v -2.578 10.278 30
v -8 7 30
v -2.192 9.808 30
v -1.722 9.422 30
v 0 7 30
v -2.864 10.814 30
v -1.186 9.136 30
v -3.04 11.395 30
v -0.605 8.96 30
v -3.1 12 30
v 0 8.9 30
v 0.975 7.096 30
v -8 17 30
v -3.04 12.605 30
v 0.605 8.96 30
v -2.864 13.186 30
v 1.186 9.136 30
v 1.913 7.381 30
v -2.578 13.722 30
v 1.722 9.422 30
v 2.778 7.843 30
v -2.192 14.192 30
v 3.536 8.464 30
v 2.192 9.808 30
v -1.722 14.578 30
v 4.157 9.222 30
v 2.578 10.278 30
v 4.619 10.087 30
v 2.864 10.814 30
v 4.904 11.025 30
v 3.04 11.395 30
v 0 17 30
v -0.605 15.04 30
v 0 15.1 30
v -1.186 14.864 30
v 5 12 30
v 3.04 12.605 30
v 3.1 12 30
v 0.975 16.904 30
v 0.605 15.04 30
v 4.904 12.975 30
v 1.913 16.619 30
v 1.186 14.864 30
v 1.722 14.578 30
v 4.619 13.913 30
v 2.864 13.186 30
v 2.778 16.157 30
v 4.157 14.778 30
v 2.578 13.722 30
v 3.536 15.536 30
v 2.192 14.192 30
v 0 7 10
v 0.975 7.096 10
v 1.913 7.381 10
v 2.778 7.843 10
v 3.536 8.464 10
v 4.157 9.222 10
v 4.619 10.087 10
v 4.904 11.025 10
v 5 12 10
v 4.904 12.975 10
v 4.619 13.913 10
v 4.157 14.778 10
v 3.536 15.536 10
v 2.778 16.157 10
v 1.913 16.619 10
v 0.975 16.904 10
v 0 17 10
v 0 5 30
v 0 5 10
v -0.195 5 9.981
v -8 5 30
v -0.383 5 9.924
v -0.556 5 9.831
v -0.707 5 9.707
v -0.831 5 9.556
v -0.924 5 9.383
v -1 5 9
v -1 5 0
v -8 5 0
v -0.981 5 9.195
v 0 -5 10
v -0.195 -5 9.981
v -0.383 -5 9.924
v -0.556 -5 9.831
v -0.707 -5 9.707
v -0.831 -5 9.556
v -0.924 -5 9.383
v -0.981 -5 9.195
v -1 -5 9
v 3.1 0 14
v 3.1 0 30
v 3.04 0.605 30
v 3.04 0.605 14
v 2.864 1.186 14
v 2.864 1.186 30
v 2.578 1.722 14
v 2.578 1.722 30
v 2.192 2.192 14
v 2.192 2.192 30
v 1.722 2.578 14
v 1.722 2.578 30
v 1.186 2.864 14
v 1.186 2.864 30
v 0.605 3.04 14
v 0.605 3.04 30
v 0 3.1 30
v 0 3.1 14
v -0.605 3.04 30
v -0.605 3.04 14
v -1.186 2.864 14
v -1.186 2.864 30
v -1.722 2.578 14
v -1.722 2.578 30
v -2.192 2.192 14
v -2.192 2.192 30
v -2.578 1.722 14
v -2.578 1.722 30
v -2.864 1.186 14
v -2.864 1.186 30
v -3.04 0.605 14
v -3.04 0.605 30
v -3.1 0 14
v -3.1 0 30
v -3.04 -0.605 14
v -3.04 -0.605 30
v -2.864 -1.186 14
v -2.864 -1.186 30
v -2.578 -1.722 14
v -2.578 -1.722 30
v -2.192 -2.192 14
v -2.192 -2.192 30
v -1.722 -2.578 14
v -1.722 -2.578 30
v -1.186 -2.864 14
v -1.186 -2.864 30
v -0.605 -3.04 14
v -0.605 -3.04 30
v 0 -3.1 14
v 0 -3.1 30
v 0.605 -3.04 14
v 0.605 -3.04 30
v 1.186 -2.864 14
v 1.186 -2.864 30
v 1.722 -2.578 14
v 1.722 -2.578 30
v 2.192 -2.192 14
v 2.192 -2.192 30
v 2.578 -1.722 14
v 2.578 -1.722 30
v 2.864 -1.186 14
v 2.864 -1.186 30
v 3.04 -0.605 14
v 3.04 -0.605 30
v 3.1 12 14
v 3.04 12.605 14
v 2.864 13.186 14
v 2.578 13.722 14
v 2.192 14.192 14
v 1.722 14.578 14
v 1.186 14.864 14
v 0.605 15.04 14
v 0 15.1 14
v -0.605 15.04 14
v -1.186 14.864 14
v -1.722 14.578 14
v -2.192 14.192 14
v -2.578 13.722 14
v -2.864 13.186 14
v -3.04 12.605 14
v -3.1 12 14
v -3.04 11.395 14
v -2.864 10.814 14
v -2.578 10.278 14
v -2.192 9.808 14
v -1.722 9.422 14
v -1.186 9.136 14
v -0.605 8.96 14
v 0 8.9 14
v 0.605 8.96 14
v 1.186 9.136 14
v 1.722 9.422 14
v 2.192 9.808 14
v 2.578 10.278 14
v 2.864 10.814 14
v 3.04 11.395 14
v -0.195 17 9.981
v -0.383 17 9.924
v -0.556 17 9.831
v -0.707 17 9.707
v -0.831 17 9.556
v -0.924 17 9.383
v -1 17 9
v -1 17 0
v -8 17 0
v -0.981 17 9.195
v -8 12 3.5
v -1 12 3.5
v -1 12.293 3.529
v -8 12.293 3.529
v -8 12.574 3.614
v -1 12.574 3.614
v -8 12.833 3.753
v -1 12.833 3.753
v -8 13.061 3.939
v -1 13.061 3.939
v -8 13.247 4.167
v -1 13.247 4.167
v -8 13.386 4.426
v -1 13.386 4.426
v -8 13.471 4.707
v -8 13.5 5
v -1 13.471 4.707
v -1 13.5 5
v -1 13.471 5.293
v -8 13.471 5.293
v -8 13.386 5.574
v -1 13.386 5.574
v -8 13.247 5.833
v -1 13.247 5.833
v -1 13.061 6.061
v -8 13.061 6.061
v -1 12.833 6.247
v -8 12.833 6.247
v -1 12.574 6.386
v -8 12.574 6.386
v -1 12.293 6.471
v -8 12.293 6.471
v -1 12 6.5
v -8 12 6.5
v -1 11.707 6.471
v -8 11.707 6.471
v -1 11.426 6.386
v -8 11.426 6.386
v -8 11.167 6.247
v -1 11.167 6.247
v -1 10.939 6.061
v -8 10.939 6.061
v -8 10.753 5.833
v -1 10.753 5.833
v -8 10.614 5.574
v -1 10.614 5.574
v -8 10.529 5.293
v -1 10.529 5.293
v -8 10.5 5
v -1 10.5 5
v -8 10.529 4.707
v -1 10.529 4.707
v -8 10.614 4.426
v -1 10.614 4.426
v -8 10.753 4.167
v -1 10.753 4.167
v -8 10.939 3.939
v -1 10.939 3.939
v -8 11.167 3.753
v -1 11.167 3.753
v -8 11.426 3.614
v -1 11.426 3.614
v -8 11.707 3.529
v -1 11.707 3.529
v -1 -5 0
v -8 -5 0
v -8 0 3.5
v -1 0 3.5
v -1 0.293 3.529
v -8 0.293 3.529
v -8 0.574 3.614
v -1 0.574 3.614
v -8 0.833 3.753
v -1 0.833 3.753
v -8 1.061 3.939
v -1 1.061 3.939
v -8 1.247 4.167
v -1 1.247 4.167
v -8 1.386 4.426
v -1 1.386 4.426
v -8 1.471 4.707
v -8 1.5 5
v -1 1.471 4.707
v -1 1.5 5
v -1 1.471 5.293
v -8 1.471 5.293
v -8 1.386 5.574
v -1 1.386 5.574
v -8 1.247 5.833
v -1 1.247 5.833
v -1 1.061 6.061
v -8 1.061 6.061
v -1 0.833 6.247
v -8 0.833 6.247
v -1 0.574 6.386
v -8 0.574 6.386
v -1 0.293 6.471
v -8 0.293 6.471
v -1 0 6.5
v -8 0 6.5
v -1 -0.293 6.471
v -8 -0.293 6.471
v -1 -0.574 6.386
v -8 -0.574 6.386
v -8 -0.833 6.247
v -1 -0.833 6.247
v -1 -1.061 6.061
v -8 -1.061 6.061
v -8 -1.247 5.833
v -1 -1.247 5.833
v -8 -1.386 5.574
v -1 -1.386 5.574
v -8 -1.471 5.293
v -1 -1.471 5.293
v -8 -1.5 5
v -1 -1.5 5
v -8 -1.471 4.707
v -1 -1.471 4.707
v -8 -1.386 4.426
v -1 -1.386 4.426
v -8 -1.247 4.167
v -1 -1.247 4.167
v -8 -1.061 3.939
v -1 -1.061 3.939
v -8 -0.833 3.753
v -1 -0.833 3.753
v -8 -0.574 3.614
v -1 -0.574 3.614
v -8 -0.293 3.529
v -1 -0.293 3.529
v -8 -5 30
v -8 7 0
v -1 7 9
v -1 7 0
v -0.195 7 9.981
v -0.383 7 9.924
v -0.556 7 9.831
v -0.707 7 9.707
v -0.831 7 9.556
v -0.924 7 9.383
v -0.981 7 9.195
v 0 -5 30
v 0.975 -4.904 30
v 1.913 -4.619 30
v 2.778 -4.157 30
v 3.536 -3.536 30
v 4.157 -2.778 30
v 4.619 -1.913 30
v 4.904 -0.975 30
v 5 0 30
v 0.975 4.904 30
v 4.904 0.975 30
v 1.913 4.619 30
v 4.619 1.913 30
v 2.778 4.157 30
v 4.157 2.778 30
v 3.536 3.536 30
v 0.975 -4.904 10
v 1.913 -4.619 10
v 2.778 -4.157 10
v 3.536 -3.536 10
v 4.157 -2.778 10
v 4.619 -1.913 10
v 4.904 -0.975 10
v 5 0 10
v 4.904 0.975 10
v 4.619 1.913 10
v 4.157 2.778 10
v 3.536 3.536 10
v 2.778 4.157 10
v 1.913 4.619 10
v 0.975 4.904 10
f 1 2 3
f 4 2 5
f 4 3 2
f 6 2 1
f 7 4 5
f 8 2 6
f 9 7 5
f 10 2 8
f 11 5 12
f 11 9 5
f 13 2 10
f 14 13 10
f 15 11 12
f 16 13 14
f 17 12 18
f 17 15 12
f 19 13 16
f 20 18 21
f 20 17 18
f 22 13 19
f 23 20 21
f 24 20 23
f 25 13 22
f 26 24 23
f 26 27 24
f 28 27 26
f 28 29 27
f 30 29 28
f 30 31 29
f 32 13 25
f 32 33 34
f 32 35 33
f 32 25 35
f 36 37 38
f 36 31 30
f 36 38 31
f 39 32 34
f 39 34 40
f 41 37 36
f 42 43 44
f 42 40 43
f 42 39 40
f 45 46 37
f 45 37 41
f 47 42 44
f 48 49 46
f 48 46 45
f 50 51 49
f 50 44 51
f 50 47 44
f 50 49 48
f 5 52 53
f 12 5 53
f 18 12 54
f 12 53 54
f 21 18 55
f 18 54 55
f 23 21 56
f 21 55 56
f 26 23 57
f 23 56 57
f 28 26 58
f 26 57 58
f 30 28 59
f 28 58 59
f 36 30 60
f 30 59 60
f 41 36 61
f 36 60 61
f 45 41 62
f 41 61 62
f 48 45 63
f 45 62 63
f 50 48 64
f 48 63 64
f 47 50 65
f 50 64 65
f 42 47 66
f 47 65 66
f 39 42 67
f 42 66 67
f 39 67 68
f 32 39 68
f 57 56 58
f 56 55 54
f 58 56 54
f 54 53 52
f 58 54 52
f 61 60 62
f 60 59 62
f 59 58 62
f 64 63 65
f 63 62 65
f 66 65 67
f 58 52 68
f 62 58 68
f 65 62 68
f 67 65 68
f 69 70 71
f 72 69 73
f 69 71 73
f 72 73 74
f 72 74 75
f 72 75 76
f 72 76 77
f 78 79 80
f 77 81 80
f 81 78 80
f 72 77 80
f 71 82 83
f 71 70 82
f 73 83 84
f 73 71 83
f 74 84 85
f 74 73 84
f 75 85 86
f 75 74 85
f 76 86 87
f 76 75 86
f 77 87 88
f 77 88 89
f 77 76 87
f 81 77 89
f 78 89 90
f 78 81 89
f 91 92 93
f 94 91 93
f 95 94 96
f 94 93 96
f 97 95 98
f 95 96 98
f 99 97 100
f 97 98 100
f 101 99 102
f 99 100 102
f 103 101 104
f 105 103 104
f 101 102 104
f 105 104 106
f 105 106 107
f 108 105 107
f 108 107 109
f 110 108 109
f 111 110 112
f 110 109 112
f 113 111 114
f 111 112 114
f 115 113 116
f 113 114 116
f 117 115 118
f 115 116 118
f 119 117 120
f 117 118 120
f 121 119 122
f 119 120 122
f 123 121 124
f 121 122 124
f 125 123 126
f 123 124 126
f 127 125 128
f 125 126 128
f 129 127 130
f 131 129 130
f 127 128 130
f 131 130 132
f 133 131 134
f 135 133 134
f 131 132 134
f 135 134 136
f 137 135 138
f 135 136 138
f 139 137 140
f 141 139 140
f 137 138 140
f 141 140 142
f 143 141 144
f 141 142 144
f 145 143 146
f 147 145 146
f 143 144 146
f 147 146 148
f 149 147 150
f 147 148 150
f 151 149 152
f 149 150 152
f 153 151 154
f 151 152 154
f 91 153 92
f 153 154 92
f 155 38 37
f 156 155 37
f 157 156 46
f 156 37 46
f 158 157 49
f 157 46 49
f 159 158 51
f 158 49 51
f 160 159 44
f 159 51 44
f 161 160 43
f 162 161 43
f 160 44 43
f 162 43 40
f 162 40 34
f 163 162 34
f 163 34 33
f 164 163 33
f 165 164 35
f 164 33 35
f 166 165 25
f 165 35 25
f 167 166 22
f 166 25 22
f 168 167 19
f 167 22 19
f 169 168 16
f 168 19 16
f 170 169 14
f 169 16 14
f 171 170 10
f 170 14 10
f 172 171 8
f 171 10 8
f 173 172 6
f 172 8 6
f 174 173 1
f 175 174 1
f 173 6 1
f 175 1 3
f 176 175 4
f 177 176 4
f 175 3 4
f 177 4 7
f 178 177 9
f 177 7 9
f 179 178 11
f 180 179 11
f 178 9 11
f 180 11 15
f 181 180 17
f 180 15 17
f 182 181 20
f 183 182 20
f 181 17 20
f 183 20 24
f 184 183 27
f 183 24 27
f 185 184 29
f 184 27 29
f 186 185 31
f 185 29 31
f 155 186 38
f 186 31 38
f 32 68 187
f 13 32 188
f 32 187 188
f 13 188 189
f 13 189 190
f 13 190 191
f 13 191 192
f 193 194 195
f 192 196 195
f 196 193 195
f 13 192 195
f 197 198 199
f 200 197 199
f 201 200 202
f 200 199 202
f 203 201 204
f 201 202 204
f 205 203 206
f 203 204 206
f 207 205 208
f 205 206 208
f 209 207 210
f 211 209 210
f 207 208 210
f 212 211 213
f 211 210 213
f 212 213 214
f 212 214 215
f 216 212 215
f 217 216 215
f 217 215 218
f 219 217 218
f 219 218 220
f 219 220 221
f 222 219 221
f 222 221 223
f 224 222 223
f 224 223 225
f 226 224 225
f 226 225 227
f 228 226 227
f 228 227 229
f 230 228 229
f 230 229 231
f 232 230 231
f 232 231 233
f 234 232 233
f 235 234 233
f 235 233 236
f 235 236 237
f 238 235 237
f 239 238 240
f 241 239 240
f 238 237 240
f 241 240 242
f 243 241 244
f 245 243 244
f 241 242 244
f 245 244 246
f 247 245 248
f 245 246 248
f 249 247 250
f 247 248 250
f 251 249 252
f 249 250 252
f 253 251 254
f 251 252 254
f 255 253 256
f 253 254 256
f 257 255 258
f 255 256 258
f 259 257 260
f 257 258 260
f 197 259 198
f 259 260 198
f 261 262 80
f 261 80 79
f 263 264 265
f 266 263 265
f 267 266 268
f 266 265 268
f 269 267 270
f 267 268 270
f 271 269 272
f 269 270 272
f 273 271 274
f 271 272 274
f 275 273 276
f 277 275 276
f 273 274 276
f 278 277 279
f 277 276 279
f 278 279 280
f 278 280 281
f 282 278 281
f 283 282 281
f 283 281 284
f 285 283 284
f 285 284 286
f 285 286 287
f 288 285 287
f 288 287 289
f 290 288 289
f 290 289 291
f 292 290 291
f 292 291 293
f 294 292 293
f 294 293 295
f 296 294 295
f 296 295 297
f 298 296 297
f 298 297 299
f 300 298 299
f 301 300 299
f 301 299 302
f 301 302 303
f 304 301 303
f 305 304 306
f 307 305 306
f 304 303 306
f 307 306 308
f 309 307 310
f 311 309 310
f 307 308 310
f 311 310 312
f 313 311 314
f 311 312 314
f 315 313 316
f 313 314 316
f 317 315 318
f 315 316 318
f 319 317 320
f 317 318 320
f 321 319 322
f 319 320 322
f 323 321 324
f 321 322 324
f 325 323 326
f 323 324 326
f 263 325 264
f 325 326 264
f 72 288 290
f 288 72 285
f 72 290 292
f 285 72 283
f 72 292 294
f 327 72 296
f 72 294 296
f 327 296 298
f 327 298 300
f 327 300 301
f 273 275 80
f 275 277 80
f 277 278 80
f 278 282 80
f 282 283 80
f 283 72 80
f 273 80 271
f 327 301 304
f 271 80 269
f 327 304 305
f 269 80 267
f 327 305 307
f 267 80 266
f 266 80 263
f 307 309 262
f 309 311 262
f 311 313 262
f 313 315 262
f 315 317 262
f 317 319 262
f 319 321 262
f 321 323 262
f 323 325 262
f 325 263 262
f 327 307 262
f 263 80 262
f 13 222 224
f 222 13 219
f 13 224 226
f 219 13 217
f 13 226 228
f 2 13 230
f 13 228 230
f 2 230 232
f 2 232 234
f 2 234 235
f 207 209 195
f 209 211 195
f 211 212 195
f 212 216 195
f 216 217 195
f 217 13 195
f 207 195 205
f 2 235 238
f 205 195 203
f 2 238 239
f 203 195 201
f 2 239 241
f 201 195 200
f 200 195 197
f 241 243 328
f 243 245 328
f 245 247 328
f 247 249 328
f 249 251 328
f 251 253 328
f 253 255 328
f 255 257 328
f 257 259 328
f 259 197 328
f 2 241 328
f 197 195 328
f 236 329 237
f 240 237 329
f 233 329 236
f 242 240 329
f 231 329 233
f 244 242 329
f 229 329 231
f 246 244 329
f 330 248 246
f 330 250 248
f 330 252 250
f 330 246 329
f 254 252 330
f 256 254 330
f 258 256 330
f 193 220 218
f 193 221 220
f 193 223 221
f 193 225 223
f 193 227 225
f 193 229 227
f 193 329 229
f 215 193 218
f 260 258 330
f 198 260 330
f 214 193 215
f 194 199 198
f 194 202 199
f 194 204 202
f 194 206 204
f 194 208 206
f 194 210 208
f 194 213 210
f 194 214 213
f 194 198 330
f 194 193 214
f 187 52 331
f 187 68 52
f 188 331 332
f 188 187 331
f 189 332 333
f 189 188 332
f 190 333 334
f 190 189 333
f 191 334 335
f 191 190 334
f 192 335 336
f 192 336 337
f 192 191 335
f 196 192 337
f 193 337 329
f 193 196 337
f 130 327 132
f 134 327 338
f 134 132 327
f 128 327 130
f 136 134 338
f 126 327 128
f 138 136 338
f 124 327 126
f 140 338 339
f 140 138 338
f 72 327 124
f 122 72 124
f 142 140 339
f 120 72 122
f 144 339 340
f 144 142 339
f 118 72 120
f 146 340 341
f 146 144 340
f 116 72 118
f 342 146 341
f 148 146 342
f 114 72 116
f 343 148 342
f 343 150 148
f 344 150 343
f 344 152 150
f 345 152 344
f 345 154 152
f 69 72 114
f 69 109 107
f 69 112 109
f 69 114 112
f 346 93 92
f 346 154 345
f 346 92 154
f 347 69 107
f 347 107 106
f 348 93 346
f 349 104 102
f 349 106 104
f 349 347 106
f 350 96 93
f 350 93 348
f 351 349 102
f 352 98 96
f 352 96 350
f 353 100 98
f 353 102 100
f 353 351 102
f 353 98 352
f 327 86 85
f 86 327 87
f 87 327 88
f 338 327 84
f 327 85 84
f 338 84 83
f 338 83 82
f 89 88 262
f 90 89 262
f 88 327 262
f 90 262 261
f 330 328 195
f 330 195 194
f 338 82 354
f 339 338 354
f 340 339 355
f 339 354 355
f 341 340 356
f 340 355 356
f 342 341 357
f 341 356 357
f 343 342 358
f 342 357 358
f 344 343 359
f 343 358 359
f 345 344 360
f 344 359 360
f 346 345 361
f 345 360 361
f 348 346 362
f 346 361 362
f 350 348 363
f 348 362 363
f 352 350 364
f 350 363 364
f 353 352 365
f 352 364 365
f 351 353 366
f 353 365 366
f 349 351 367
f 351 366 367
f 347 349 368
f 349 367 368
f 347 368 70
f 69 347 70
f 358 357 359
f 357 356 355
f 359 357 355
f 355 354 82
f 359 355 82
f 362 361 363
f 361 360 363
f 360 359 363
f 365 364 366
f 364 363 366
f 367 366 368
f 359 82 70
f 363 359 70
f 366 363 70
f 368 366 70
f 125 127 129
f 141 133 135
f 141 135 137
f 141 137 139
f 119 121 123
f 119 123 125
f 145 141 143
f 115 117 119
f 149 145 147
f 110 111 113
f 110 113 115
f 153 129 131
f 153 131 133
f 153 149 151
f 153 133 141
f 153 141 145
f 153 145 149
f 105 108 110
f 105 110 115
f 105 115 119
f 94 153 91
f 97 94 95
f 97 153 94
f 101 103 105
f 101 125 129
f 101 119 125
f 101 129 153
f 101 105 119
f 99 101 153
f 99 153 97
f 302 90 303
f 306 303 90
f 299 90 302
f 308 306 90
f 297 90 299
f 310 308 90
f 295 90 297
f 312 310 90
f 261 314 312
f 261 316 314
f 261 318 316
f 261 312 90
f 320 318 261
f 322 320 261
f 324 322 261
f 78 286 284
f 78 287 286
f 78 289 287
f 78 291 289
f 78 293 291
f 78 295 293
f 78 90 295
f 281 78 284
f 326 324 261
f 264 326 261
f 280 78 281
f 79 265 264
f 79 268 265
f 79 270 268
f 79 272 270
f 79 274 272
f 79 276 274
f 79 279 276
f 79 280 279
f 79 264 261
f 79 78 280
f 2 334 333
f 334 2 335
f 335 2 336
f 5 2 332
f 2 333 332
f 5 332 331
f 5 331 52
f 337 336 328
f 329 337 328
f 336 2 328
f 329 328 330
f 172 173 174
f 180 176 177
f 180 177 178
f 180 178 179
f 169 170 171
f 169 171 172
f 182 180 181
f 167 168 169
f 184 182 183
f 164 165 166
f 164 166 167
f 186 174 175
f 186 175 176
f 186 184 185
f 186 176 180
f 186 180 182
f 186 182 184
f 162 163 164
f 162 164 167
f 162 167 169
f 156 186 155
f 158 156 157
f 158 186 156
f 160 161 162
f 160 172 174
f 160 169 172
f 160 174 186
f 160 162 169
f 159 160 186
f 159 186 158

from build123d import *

# Parameters (mm, degrees)
MAIN_DEPTH                     = 30
SKETCH2_R                      = 3.1
SHAFTHOLE_DEPTH                = 16
SKETCH3_W                      = 10
SKETCH3_H                      = 10
MAKERBEAMRECTANGULARHOLE_DEPTH = 7
SKETCH4_R                      = 1.5
MAKERBEAMHOLE_DEPTH            = 8
FILLET1_R                      = 1
LPATTERN1_COUNT                = 2
LPATTERN1_PITCH                = 12


with BuildPart() as part:
    # Sketch1 → Main (new body)
    with BuildSketch(Plane.XY):
        with BuildLine():
            Line((-8, 5), (-8, -5))
            Line((-8, -5), (0, -5))
            ThreePointArc((0, -5), (5, 0), (0, 5))
            Line((0, 5), (-8, 5))
        make_face()
    extrude(amount=MAIN_DEPTH)

    # Sketch2 → ShaftHole (cut)
    with BuildSketch(Plane.XY.offset(30)):
        Circle(SKETCH2_R)
    extrude(amount=-SHAFTHOLE_DEPTH, mode=Mode.SUBTRACT)

    # Sketch3 → MakerBeamRectangularHole (cut, through all)
    with BuildSketch(Plane(origin=(-1, 0, 0), x_dir=(0, 0, -1), z_dir=(1, 0, 0))):
        with Locations((-5, 0)):
            Rectangle(SKETCH3_W, SKETCH3_H)
    extrude(amount=MAKERBEAMRECTANGULARHOLE_DEPTH, mode=Mode.SUBTRACT)

    # Sketch4 → MakerBeamHole (cut, through all)
    with BuildSketch(Plane(origin=(-1, 0, 0), x_dir=(0, 0, -1), z_dir=(1, 0, 0))):
        with Locations((-5, 0)):
            Circle(SKETCH4_R)
    extrude(amount=-MAKERBEAMHOLE_DEPTH, mode=Mode.SUBTRACT)

    # Fillet1
    fillet1_edges = [part.edges().sort_by_distance(p)[0] for p in [
        (-1, 0, 10),
    ]]
    fillet(fillet1_edges, radius=FILLET1_R)


with BuildPart() as lpattern1_1:
    # LPattern1: pattern copy
    add(part.part.moved(Location(Vector(0, 1, 0) * (1 * LPATTERN1_PITCH))))


solid = Compound([part.part, lpattern1_1.part])
